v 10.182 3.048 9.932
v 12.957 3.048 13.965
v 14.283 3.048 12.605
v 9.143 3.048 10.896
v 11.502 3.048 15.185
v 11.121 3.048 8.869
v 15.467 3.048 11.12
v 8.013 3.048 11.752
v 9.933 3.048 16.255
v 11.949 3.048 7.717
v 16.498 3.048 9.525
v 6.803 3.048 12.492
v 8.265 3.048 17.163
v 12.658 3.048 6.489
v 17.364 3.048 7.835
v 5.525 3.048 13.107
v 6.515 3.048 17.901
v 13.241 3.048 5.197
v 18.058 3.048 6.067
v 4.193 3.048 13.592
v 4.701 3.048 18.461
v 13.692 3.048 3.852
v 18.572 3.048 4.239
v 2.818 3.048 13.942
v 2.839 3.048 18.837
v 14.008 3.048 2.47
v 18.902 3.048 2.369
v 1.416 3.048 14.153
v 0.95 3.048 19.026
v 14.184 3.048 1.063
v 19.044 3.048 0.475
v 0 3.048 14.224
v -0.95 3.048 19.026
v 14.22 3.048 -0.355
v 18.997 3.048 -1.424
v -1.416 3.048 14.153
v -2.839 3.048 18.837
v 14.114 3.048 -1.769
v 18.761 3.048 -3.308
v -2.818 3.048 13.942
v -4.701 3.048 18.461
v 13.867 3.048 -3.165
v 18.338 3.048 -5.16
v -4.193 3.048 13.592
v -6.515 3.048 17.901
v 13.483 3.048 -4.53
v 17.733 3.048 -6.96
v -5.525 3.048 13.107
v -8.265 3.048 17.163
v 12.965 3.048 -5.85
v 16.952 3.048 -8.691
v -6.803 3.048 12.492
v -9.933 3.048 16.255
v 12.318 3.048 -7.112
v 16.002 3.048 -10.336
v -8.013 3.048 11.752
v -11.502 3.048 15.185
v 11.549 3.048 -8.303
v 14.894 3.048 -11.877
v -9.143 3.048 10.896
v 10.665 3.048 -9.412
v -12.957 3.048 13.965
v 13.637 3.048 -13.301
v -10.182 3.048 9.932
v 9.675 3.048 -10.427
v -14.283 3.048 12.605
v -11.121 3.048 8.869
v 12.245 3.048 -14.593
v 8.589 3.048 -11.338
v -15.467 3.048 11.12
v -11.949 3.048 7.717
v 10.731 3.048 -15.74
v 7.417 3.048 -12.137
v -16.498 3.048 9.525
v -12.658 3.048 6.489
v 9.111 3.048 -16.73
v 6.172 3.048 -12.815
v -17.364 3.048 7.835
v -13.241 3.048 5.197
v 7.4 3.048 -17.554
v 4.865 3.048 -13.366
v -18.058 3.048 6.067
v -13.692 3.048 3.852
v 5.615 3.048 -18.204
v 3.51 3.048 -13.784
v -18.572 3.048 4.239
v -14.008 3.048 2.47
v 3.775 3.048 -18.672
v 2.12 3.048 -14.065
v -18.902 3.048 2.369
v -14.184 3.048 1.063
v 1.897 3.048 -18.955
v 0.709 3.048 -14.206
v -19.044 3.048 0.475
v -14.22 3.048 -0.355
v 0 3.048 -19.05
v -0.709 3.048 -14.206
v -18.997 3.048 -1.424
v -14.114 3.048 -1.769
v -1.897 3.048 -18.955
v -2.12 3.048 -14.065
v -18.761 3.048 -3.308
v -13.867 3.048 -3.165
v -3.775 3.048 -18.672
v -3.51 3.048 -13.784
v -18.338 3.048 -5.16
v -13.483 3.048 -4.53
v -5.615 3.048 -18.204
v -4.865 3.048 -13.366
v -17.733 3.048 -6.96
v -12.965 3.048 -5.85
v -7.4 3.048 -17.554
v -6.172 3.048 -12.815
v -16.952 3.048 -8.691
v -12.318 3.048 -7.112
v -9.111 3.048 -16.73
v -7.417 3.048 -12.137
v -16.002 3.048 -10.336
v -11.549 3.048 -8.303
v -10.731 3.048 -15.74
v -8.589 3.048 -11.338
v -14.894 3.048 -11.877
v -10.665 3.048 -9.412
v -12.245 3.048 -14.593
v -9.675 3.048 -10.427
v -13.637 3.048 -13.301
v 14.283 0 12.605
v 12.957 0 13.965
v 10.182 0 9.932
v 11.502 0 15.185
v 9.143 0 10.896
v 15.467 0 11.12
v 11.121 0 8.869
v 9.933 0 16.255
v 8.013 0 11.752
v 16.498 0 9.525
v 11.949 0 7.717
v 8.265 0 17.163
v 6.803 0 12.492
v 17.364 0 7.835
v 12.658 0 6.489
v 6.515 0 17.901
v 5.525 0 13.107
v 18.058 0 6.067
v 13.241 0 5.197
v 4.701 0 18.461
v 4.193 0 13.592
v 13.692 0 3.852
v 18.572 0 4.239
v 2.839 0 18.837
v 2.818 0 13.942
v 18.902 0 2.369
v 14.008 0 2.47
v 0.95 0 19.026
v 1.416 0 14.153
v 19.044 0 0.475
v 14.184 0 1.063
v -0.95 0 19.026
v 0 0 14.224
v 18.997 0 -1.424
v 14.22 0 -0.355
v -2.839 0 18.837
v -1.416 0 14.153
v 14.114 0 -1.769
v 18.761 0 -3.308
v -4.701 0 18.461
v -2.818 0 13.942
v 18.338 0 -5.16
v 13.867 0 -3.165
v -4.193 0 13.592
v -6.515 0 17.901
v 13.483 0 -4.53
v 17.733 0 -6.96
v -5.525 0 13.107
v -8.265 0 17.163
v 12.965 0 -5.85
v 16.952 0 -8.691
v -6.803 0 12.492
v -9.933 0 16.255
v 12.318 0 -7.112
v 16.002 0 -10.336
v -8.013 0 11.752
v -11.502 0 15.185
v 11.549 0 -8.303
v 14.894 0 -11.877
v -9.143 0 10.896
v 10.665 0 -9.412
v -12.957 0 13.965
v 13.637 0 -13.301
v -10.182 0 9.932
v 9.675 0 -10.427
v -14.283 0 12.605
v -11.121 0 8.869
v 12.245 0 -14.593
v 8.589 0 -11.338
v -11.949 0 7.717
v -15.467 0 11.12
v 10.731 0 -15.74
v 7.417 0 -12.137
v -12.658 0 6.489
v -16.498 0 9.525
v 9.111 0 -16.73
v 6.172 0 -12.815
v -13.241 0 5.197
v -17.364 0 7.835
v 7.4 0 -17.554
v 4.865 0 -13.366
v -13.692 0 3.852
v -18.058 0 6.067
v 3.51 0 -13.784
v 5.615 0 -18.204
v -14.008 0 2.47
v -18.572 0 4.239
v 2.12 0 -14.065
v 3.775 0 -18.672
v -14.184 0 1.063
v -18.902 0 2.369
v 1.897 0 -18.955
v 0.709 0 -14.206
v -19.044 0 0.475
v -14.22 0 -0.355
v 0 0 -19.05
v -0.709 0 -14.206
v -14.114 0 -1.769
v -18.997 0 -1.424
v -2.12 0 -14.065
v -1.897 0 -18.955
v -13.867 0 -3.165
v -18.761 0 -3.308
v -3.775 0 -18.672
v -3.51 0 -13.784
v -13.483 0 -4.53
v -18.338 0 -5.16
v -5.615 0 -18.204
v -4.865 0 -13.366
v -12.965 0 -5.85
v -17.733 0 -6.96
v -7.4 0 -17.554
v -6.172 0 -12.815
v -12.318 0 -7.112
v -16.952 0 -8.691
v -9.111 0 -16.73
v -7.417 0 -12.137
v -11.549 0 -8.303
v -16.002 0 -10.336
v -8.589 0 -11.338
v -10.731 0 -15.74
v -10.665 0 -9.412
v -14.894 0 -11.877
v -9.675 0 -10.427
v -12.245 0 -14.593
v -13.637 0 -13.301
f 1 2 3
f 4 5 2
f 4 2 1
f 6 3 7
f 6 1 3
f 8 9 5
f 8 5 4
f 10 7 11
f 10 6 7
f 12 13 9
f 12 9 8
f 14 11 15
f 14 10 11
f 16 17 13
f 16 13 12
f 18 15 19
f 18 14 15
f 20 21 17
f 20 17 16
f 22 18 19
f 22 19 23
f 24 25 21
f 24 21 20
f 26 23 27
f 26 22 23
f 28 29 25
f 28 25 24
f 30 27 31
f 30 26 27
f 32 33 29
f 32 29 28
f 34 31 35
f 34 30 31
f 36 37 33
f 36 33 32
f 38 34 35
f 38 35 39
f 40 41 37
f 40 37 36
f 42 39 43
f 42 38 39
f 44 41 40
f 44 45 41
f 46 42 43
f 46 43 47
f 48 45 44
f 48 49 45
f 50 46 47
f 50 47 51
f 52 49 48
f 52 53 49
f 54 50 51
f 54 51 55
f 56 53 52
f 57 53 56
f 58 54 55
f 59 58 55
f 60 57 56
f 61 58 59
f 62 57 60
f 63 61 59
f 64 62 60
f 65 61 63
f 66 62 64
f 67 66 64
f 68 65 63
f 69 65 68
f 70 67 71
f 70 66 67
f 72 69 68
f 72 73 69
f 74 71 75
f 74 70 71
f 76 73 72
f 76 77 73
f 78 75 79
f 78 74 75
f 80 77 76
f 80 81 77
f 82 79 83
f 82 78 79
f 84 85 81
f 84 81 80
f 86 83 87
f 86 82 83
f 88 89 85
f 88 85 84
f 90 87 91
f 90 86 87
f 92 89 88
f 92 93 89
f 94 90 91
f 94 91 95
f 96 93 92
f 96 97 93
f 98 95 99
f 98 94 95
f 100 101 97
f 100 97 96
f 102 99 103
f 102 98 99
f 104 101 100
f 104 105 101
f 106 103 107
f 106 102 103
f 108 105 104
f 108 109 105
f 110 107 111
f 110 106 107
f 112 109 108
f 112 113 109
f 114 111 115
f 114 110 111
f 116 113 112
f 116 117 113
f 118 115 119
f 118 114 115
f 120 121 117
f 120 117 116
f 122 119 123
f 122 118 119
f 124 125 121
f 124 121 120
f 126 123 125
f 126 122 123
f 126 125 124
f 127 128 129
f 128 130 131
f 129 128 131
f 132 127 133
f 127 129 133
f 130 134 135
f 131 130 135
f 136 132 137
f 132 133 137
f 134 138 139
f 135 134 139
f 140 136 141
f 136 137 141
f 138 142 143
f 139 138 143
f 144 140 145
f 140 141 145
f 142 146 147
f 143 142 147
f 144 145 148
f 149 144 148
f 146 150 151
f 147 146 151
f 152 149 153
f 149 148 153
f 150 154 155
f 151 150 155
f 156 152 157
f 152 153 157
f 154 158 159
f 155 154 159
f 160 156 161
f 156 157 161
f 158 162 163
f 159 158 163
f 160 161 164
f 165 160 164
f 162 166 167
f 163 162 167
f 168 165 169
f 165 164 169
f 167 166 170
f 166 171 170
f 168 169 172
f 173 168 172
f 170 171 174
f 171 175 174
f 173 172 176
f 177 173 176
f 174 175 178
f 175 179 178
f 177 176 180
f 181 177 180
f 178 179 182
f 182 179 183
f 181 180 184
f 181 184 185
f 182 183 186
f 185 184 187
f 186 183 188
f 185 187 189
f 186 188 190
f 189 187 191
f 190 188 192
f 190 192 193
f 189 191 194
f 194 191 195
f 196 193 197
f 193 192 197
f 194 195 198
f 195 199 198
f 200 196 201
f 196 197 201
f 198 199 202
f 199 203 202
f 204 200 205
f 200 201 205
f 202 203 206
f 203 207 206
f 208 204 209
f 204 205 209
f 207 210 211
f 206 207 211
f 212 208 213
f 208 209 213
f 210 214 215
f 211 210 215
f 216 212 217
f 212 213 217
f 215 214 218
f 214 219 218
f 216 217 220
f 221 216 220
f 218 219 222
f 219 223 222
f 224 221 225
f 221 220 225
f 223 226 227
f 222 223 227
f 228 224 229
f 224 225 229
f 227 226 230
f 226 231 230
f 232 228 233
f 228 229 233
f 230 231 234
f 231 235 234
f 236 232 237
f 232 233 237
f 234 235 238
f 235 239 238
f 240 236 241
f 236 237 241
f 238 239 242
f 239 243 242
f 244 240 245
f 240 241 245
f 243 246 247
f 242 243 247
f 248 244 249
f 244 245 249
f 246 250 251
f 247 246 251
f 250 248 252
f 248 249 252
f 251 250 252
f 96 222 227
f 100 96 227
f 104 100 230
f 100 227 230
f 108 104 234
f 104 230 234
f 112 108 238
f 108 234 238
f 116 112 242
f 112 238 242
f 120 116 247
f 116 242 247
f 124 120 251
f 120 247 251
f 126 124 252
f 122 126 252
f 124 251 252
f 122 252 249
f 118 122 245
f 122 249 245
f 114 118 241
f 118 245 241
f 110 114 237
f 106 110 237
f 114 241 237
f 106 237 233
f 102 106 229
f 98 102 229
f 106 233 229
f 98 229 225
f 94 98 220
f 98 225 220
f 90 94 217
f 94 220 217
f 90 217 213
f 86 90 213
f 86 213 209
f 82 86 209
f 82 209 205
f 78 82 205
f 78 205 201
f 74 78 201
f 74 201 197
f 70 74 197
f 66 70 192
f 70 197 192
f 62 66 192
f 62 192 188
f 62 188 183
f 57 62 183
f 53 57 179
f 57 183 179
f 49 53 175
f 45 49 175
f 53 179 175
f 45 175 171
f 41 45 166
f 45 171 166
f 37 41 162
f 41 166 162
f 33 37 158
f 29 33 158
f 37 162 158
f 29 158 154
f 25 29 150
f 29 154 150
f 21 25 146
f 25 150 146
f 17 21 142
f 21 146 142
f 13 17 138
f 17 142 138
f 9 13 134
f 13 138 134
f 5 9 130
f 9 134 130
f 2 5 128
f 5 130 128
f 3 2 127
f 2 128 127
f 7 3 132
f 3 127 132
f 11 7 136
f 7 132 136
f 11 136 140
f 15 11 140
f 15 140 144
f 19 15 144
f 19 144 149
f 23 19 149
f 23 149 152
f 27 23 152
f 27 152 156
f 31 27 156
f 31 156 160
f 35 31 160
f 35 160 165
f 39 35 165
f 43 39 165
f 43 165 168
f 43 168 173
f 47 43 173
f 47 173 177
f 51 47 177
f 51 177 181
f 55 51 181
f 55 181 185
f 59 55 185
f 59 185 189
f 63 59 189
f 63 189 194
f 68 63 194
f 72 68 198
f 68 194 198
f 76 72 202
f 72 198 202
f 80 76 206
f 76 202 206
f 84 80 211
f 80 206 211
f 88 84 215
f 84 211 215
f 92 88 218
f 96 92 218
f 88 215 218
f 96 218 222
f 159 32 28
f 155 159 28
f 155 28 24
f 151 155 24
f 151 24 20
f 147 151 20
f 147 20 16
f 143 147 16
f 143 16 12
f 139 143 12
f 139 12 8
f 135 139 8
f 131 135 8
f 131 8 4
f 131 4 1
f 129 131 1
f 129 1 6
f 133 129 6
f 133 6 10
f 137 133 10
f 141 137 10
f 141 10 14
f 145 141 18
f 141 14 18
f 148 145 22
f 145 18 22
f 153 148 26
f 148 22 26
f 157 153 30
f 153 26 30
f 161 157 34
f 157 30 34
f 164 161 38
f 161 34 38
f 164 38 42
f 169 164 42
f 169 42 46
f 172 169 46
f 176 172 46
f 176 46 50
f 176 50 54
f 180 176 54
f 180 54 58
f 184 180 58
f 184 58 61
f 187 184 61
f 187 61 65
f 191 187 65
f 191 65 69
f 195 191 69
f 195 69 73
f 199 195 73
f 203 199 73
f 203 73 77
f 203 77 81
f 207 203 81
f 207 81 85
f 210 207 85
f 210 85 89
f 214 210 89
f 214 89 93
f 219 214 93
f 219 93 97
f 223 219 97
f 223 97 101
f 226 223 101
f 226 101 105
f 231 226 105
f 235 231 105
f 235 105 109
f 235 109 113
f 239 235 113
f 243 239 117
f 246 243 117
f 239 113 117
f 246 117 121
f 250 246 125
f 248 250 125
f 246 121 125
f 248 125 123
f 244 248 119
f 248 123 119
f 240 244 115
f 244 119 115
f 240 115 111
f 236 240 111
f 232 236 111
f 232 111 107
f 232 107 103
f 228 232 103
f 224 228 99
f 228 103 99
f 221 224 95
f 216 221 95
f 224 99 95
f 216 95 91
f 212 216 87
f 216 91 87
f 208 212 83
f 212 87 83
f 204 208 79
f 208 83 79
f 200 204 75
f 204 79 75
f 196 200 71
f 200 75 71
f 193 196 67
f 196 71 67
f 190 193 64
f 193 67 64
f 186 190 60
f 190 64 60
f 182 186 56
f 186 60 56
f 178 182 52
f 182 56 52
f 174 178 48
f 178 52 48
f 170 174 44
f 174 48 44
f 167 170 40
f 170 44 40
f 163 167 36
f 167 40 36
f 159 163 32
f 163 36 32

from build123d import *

# Parameters (mm, degrees)
SKETCH1_R           = 19.05
BOSS_EXTRUDE1_DEPTH = 3.048
SKETCH2_R           = 14.224
CUT_EXTRUDE1_DEPTH  = 28.112641037


with BuildPart() as part:
    # Sketch1 → Boss-Extrude1 (new body)
    with BuildSketch(Plane(origin=(0, 0, 0), x_dir=(1, 0, 0), z_dir=(0, 1, 0))):
        with Locations(Location((0, 0, 0), (0, 0, 90))):
            Circle(SKETCH1_R)
    extrude(amount=BOSS_EXTRUDE1_DEPTH)

    # Sketch2 → Cut-Extrude1 (cut, through all)
    with BuildSketch(Plane(origin=(0, 3.048, 0), x_dir=(1, 0, 0), z_dir=(0, 1, 0))):
        with Locations(Location((0, 0, 0), (0, 0, 270))):
            Circle(SKETCH2_R)
    extrude(amount=-CUT_EXTRUDE1_DEPTH, mode=Mode.SUBTRACT)


solid = part.part
